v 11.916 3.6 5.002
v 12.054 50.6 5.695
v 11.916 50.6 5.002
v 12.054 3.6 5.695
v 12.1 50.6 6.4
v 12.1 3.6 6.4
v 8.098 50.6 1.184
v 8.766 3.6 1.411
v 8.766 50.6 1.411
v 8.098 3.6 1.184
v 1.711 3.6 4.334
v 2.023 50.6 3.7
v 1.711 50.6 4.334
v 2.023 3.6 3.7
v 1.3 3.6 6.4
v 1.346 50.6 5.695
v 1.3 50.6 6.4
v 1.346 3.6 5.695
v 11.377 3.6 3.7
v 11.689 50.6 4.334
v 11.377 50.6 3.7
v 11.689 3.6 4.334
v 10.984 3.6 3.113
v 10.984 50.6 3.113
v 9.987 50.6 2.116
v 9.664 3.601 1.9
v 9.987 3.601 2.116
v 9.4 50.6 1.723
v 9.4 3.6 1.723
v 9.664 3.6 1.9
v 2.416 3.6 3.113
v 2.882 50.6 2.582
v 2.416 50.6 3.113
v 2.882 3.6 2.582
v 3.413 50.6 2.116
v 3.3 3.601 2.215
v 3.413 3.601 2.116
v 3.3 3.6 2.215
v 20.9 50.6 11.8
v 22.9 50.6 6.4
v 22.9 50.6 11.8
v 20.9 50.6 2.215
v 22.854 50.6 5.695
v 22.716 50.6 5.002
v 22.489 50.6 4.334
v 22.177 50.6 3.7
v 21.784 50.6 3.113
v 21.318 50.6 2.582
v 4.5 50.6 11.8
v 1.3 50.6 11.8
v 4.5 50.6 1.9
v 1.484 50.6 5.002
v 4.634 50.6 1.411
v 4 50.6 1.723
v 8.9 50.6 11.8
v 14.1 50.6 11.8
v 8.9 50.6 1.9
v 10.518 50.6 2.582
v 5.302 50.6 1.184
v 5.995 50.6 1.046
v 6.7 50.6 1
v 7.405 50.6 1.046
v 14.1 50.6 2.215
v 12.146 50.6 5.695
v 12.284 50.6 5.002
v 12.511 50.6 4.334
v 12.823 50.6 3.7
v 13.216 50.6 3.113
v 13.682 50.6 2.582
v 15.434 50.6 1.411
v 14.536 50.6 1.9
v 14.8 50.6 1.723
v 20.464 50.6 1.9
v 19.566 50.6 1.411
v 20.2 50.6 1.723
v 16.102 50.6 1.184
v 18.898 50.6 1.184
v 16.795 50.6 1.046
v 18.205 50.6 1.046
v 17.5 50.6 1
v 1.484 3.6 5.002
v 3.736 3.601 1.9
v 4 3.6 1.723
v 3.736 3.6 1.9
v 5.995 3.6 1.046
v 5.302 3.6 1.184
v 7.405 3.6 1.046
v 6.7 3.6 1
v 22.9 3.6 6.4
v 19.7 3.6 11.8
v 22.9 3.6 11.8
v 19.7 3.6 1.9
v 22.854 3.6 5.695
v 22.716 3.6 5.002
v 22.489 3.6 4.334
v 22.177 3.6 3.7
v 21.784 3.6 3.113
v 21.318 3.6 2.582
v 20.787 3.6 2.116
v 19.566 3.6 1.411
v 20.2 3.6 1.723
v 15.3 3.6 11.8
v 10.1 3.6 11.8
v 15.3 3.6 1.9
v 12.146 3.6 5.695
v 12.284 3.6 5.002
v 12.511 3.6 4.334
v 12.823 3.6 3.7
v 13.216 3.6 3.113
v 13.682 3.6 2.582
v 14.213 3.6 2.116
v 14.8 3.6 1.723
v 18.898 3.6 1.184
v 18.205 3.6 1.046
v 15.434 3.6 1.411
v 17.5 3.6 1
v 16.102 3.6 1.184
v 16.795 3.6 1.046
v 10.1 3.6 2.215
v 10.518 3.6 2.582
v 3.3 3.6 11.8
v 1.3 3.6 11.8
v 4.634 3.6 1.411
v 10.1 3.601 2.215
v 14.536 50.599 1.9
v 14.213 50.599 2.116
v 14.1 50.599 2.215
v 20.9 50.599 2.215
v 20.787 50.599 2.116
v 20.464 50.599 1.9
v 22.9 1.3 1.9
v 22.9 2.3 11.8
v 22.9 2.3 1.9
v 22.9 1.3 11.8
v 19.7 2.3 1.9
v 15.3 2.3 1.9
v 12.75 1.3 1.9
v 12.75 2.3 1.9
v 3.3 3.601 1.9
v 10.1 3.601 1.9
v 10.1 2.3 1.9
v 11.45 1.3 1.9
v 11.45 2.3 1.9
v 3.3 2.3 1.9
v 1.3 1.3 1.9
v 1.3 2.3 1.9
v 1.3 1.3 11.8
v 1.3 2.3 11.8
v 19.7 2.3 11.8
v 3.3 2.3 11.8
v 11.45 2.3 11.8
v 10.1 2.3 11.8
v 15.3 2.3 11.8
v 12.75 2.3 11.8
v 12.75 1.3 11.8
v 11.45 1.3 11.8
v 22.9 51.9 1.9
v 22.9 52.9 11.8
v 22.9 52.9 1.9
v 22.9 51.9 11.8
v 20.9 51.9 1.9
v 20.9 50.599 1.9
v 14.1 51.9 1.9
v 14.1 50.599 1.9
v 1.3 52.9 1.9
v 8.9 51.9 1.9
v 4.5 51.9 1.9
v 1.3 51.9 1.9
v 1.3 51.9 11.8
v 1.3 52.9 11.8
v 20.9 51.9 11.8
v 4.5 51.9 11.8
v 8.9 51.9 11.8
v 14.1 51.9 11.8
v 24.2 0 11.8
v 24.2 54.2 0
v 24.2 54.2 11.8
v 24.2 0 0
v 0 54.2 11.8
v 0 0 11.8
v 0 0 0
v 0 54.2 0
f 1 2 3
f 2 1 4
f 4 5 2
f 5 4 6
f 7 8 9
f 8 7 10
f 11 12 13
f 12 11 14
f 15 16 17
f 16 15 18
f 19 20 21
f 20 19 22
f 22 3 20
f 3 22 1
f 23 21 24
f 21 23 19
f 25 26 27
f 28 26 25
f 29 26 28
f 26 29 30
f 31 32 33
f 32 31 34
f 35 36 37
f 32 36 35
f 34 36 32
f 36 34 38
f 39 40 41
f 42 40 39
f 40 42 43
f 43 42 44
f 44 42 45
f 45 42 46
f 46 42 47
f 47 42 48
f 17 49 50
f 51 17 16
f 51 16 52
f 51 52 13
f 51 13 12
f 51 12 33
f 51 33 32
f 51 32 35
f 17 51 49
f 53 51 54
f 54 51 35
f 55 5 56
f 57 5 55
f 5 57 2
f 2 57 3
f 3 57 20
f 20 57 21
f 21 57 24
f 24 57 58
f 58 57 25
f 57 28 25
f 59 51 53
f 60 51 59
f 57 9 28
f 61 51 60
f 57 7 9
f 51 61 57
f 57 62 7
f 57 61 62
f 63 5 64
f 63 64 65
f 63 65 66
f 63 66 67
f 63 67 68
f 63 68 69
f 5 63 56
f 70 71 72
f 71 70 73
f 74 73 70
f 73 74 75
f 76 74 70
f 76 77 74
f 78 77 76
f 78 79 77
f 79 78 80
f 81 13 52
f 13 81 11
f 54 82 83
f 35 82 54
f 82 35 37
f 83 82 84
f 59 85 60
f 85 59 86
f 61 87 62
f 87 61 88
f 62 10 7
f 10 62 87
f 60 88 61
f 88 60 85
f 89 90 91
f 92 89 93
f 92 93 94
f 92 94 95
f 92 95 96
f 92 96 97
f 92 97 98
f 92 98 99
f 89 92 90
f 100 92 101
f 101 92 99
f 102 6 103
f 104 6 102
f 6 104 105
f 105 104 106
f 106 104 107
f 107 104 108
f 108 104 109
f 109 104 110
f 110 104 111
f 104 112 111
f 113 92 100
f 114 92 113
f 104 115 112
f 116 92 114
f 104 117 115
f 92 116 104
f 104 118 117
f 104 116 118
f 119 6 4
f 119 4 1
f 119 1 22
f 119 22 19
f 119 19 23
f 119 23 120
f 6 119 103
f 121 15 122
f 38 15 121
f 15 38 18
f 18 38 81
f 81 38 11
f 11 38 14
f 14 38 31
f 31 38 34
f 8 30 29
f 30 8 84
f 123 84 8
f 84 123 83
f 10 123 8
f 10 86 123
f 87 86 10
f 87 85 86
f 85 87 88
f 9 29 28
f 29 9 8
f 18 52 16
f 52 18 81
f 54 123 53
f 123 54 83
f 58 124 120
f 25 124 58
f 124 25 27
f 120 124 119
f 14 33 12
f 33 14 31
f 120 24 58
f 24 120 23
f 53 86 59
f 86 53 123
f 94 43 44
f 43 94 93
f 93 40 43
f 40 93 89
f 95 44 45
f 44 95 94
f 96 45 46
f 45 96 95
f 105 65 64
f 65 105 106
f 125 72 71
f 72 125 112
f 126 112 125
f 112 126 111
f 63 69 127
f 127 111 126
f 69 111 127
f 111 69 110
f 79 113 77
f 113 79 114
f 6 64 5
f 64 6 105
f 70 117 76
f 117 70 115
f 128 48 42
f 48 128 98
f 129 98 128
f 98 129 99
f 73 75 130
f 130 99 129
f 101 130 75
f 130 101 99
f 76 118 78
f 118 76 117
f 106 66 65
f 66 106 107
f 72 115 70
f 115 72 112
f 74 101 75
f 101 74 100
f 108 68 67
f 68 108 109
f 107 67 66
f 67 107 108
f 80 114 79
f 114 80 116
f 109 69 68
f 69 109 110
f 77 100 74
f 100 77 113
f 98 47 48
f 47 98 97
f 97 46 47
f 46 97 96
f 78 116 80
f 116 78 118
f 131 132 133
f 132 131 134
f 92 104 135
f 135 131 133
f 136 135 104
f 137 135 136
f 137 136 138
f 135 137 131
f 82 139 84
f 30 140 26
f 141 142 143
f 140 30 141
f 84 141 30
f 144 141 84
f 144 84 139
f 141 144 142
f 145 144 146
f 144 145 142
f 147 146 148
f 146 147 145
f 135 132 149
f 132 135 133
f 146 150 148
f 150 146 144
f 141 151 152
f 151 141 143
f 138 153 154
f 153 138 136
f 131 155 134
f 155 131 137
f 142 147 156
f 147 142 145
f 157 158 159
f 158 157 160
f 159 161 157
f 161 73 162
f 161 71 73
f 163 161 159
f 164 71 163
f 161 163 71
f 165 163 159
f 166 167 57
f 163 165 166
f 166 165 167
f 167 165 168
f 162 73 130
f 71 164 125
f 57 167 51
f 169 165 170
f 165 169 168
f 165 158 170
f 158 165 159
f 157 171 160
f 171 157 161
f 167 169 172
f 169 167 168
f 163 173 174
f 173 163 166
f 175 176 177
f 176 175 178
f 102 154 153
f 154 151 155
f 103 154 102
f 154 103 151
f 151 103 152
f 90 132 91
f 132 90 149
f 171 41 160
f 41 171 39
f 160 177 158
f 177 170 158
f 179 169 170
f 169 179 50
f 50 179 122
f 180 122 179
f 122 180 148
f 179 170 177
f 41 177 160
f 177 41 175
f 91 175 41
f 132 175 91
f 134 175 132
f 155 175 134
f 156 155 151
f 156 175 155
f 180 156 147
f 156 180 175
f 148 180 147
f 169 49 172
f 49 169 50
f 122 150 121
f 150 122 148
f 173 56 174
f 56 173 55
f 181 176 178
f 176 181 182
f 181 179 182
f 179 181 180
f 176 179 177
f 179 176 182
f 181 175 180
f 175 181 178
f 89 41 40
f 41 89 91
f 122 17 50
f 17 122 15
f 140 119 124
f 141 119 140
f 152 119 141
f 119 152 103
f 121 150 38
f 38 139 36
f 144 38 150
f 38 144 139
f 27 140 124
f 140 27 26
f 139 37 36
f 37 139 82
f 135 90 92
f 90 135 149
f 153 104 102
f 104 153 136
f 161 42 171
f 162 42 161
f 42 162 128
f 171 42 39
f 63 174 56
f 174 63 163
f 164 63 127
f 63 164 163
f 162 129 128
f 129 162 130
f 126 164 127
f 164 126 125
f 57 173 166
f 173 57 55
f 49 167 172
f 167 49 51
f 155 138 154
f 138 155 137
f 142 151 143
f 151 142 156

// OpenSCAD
/*
for(x = [2.3, 23.1]) {
	for(y = [2.3]) {
		translate([x, y, 0]) cylinder(d=3.0, h=10.0, $fn=24);
	}
}
*/


module batteryHolder() {
	w = 1.3;
	batt = 10.8;
	inner = 51.6;
	h = 1;
	
	difference() {
		cube([2 * w + 2 * batt, inner + 2*w, h + batt]);
		translate([w, w + 2.3, h+batt/2]) cube([2 * batt, inner - 2.3 - 2.3, batt/2 + 0.1]);
		for(i = [w+batt/2, w+3*batt/2]) {
			translate([i, 2.3+w, h + batt/2]) rotate([-90, 0, 0]) cylinder(d=batt, h=inner - 2.3 - 2.3, $fn=48); 
		}
		for(i = [w, inner + w - 1.0]) {
			translate([w, i, h+0.9]) cube([2*batt, 1.0, 10]);
		}
	
		translate([w + 2, w + 0.9, h+0.9]) cube([6.8, 1.401, 100]);
		translate([w + batt + 3.2, w + 0.9, h + 0.9]) cube([4.4, 1.401, 100]);
		
		translate([w + batt + 2, inner - 1.001, h+0.9]) cube([6.8, 1.401, 100]);
		translate([w + 3.2, inner - 1.001, h + 0.9]) cube([4.4, 1.401, 100]);
		
		
		
	}
	
	translate([w + batt - w/2, 0, 0]) cube([w, 2*w, h+batt]);
}

batteryHolder();
